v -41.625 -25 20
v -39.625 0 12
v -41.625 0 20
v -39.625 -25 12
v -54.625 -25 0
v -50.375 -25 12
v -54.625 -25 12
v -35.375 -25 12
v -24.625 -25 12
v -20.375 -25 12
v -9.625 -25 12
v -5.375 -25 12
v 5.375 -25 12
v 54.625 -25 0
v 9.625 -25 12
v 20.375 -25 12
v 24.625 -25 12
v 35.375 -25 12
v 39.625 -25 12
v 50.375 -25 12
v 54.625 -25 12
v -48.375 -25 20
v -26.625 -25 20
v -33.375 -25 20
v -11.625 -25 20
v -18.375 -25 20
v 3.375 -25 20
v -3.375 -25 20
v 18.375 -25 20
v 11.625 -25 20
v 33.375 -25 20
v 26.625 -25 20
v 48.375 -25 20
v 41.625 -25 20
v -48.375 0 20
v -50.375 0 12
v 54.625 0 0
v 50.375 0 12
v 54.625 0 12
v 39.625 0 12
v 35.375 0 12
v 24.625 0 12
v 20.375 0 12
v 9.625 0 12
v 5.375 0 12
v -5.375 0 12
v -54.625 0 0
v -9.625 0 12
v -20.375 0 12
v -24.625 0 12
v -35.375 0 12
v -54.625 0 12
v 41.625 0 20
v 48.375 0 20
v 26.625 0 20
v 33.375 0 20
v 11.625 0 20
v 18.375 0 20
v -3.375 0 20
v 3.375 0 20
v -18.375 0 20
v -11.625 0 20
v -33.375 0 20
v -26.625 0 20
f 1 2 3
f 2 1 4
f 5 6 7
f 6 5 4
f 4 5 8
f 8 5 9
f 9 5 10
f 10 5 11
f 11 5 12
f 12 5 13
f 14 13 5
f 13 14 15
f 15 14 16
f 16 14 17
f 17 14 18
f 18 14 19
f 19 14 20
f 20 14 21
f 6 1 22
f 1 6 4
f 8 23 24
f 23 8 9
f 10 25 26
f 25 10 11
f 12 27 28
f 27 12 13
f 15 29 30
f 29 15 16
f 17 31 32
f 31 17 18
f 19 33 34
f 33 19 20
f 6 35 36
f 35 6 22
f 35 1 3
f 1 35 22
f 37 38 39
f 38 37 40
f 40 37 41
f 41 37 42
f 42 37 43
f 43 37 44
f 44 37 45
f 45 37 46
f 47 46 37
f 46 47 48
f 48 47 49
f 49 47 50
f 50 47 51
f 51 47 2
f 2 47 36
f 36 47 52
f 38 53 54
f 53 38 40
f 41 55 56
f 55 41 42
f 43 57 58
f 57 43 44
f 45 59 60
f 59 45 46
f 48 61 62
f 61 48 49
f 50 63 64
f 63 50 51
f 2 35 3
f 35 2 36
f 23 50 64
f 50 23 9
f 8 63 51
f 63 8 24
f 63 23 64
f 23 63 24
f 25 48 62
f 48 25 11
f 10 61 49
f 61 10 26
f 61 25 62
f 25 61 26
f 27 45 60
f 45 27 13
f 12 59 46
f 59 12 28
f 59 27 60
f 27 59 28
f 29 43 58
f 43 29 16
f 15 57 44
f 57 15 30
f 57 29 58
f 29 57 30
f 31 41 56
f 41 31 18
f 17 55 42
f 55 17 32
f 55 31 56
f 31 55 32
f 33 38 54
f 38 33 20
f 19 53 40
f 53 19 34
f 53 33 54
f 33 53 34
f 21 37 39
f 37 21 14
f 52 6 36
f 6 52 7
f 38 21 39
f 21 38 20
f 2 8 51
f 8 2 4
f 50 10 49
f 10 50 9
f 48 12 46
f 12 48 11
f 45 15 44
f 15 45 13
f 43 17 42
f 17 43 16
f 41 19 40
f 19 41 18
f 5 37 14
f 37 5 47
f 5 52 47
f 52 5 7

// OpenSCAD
$fn = 32;

// ----------------------------------------------------------------------
// Toothed rack, 7 teeth
// 15 mm pitch, 8 mm teeth
// ----------------------------------------------------------------------

// --- parameters (mm) ---
bar_w = 25;      // bar width (Y)
bar_h = 12;      // bar height (Z)
teeth = 7;       // number of teeth
pitch = 15;      // tooth pitch
tooth_h = 8;     // tooth height above the bar
root_w = 11.25;  // tooth width at the root
crest_w = 6.75;  // tooth width at the crest

// --- derived feature positions (mm) ---
span = (teeth - 1) * pitch;  // = 90   distance between the outer teeth
bar_l = span + root_w + 8;   // = 109.25   bar length: teeth plus 4 mm at each end
tooth_x = -span / 2;         // = -45   X of the first tooth
height = bar_h + tooth_h;    // = 20   overall height
feature_centers = [
  [tooth_x + 0 * pitch, -bar_w / 2],
  [tooth_x + 1 * pitch, -bar_w / 2],
  [tooth_x + 2 * pitch, -bar_w / 2],
  [tooth_x + 3 * pitch, -bar_w / 2],
  [tooth_x + 4 * pitch, -bar_w / 2],
  [tooth_x + 5 * pitch, -bar_w / 2],
  [tooth_x + 6 * pitch, -bar_w / 2]
];   // tooth centre line, drives the tooth loop

// bar with a rack of teeth, one extruded trapezoium per centre
module rack_tooth() {
  linear_extrude(height = bar_w)
    polygon(points = [
      [0, 0],
      [root_w, 0],
      [root_w / 2 + crest_w / 2, tooth_h + 1],
      [root_w / 2 - crest_w / 2, tooth_h + 1]
    ]);
}

union() {
  translate([-bar_l / 2, -bar_w, 0]) cube([bar_l, bar_w, bar_h]);
  for (centre = feature_centers)
    translate([centre[0] - root_w / 2, 0, bar_h - 1]) rotate([90, 0, 0]) rack_tooth();
}
